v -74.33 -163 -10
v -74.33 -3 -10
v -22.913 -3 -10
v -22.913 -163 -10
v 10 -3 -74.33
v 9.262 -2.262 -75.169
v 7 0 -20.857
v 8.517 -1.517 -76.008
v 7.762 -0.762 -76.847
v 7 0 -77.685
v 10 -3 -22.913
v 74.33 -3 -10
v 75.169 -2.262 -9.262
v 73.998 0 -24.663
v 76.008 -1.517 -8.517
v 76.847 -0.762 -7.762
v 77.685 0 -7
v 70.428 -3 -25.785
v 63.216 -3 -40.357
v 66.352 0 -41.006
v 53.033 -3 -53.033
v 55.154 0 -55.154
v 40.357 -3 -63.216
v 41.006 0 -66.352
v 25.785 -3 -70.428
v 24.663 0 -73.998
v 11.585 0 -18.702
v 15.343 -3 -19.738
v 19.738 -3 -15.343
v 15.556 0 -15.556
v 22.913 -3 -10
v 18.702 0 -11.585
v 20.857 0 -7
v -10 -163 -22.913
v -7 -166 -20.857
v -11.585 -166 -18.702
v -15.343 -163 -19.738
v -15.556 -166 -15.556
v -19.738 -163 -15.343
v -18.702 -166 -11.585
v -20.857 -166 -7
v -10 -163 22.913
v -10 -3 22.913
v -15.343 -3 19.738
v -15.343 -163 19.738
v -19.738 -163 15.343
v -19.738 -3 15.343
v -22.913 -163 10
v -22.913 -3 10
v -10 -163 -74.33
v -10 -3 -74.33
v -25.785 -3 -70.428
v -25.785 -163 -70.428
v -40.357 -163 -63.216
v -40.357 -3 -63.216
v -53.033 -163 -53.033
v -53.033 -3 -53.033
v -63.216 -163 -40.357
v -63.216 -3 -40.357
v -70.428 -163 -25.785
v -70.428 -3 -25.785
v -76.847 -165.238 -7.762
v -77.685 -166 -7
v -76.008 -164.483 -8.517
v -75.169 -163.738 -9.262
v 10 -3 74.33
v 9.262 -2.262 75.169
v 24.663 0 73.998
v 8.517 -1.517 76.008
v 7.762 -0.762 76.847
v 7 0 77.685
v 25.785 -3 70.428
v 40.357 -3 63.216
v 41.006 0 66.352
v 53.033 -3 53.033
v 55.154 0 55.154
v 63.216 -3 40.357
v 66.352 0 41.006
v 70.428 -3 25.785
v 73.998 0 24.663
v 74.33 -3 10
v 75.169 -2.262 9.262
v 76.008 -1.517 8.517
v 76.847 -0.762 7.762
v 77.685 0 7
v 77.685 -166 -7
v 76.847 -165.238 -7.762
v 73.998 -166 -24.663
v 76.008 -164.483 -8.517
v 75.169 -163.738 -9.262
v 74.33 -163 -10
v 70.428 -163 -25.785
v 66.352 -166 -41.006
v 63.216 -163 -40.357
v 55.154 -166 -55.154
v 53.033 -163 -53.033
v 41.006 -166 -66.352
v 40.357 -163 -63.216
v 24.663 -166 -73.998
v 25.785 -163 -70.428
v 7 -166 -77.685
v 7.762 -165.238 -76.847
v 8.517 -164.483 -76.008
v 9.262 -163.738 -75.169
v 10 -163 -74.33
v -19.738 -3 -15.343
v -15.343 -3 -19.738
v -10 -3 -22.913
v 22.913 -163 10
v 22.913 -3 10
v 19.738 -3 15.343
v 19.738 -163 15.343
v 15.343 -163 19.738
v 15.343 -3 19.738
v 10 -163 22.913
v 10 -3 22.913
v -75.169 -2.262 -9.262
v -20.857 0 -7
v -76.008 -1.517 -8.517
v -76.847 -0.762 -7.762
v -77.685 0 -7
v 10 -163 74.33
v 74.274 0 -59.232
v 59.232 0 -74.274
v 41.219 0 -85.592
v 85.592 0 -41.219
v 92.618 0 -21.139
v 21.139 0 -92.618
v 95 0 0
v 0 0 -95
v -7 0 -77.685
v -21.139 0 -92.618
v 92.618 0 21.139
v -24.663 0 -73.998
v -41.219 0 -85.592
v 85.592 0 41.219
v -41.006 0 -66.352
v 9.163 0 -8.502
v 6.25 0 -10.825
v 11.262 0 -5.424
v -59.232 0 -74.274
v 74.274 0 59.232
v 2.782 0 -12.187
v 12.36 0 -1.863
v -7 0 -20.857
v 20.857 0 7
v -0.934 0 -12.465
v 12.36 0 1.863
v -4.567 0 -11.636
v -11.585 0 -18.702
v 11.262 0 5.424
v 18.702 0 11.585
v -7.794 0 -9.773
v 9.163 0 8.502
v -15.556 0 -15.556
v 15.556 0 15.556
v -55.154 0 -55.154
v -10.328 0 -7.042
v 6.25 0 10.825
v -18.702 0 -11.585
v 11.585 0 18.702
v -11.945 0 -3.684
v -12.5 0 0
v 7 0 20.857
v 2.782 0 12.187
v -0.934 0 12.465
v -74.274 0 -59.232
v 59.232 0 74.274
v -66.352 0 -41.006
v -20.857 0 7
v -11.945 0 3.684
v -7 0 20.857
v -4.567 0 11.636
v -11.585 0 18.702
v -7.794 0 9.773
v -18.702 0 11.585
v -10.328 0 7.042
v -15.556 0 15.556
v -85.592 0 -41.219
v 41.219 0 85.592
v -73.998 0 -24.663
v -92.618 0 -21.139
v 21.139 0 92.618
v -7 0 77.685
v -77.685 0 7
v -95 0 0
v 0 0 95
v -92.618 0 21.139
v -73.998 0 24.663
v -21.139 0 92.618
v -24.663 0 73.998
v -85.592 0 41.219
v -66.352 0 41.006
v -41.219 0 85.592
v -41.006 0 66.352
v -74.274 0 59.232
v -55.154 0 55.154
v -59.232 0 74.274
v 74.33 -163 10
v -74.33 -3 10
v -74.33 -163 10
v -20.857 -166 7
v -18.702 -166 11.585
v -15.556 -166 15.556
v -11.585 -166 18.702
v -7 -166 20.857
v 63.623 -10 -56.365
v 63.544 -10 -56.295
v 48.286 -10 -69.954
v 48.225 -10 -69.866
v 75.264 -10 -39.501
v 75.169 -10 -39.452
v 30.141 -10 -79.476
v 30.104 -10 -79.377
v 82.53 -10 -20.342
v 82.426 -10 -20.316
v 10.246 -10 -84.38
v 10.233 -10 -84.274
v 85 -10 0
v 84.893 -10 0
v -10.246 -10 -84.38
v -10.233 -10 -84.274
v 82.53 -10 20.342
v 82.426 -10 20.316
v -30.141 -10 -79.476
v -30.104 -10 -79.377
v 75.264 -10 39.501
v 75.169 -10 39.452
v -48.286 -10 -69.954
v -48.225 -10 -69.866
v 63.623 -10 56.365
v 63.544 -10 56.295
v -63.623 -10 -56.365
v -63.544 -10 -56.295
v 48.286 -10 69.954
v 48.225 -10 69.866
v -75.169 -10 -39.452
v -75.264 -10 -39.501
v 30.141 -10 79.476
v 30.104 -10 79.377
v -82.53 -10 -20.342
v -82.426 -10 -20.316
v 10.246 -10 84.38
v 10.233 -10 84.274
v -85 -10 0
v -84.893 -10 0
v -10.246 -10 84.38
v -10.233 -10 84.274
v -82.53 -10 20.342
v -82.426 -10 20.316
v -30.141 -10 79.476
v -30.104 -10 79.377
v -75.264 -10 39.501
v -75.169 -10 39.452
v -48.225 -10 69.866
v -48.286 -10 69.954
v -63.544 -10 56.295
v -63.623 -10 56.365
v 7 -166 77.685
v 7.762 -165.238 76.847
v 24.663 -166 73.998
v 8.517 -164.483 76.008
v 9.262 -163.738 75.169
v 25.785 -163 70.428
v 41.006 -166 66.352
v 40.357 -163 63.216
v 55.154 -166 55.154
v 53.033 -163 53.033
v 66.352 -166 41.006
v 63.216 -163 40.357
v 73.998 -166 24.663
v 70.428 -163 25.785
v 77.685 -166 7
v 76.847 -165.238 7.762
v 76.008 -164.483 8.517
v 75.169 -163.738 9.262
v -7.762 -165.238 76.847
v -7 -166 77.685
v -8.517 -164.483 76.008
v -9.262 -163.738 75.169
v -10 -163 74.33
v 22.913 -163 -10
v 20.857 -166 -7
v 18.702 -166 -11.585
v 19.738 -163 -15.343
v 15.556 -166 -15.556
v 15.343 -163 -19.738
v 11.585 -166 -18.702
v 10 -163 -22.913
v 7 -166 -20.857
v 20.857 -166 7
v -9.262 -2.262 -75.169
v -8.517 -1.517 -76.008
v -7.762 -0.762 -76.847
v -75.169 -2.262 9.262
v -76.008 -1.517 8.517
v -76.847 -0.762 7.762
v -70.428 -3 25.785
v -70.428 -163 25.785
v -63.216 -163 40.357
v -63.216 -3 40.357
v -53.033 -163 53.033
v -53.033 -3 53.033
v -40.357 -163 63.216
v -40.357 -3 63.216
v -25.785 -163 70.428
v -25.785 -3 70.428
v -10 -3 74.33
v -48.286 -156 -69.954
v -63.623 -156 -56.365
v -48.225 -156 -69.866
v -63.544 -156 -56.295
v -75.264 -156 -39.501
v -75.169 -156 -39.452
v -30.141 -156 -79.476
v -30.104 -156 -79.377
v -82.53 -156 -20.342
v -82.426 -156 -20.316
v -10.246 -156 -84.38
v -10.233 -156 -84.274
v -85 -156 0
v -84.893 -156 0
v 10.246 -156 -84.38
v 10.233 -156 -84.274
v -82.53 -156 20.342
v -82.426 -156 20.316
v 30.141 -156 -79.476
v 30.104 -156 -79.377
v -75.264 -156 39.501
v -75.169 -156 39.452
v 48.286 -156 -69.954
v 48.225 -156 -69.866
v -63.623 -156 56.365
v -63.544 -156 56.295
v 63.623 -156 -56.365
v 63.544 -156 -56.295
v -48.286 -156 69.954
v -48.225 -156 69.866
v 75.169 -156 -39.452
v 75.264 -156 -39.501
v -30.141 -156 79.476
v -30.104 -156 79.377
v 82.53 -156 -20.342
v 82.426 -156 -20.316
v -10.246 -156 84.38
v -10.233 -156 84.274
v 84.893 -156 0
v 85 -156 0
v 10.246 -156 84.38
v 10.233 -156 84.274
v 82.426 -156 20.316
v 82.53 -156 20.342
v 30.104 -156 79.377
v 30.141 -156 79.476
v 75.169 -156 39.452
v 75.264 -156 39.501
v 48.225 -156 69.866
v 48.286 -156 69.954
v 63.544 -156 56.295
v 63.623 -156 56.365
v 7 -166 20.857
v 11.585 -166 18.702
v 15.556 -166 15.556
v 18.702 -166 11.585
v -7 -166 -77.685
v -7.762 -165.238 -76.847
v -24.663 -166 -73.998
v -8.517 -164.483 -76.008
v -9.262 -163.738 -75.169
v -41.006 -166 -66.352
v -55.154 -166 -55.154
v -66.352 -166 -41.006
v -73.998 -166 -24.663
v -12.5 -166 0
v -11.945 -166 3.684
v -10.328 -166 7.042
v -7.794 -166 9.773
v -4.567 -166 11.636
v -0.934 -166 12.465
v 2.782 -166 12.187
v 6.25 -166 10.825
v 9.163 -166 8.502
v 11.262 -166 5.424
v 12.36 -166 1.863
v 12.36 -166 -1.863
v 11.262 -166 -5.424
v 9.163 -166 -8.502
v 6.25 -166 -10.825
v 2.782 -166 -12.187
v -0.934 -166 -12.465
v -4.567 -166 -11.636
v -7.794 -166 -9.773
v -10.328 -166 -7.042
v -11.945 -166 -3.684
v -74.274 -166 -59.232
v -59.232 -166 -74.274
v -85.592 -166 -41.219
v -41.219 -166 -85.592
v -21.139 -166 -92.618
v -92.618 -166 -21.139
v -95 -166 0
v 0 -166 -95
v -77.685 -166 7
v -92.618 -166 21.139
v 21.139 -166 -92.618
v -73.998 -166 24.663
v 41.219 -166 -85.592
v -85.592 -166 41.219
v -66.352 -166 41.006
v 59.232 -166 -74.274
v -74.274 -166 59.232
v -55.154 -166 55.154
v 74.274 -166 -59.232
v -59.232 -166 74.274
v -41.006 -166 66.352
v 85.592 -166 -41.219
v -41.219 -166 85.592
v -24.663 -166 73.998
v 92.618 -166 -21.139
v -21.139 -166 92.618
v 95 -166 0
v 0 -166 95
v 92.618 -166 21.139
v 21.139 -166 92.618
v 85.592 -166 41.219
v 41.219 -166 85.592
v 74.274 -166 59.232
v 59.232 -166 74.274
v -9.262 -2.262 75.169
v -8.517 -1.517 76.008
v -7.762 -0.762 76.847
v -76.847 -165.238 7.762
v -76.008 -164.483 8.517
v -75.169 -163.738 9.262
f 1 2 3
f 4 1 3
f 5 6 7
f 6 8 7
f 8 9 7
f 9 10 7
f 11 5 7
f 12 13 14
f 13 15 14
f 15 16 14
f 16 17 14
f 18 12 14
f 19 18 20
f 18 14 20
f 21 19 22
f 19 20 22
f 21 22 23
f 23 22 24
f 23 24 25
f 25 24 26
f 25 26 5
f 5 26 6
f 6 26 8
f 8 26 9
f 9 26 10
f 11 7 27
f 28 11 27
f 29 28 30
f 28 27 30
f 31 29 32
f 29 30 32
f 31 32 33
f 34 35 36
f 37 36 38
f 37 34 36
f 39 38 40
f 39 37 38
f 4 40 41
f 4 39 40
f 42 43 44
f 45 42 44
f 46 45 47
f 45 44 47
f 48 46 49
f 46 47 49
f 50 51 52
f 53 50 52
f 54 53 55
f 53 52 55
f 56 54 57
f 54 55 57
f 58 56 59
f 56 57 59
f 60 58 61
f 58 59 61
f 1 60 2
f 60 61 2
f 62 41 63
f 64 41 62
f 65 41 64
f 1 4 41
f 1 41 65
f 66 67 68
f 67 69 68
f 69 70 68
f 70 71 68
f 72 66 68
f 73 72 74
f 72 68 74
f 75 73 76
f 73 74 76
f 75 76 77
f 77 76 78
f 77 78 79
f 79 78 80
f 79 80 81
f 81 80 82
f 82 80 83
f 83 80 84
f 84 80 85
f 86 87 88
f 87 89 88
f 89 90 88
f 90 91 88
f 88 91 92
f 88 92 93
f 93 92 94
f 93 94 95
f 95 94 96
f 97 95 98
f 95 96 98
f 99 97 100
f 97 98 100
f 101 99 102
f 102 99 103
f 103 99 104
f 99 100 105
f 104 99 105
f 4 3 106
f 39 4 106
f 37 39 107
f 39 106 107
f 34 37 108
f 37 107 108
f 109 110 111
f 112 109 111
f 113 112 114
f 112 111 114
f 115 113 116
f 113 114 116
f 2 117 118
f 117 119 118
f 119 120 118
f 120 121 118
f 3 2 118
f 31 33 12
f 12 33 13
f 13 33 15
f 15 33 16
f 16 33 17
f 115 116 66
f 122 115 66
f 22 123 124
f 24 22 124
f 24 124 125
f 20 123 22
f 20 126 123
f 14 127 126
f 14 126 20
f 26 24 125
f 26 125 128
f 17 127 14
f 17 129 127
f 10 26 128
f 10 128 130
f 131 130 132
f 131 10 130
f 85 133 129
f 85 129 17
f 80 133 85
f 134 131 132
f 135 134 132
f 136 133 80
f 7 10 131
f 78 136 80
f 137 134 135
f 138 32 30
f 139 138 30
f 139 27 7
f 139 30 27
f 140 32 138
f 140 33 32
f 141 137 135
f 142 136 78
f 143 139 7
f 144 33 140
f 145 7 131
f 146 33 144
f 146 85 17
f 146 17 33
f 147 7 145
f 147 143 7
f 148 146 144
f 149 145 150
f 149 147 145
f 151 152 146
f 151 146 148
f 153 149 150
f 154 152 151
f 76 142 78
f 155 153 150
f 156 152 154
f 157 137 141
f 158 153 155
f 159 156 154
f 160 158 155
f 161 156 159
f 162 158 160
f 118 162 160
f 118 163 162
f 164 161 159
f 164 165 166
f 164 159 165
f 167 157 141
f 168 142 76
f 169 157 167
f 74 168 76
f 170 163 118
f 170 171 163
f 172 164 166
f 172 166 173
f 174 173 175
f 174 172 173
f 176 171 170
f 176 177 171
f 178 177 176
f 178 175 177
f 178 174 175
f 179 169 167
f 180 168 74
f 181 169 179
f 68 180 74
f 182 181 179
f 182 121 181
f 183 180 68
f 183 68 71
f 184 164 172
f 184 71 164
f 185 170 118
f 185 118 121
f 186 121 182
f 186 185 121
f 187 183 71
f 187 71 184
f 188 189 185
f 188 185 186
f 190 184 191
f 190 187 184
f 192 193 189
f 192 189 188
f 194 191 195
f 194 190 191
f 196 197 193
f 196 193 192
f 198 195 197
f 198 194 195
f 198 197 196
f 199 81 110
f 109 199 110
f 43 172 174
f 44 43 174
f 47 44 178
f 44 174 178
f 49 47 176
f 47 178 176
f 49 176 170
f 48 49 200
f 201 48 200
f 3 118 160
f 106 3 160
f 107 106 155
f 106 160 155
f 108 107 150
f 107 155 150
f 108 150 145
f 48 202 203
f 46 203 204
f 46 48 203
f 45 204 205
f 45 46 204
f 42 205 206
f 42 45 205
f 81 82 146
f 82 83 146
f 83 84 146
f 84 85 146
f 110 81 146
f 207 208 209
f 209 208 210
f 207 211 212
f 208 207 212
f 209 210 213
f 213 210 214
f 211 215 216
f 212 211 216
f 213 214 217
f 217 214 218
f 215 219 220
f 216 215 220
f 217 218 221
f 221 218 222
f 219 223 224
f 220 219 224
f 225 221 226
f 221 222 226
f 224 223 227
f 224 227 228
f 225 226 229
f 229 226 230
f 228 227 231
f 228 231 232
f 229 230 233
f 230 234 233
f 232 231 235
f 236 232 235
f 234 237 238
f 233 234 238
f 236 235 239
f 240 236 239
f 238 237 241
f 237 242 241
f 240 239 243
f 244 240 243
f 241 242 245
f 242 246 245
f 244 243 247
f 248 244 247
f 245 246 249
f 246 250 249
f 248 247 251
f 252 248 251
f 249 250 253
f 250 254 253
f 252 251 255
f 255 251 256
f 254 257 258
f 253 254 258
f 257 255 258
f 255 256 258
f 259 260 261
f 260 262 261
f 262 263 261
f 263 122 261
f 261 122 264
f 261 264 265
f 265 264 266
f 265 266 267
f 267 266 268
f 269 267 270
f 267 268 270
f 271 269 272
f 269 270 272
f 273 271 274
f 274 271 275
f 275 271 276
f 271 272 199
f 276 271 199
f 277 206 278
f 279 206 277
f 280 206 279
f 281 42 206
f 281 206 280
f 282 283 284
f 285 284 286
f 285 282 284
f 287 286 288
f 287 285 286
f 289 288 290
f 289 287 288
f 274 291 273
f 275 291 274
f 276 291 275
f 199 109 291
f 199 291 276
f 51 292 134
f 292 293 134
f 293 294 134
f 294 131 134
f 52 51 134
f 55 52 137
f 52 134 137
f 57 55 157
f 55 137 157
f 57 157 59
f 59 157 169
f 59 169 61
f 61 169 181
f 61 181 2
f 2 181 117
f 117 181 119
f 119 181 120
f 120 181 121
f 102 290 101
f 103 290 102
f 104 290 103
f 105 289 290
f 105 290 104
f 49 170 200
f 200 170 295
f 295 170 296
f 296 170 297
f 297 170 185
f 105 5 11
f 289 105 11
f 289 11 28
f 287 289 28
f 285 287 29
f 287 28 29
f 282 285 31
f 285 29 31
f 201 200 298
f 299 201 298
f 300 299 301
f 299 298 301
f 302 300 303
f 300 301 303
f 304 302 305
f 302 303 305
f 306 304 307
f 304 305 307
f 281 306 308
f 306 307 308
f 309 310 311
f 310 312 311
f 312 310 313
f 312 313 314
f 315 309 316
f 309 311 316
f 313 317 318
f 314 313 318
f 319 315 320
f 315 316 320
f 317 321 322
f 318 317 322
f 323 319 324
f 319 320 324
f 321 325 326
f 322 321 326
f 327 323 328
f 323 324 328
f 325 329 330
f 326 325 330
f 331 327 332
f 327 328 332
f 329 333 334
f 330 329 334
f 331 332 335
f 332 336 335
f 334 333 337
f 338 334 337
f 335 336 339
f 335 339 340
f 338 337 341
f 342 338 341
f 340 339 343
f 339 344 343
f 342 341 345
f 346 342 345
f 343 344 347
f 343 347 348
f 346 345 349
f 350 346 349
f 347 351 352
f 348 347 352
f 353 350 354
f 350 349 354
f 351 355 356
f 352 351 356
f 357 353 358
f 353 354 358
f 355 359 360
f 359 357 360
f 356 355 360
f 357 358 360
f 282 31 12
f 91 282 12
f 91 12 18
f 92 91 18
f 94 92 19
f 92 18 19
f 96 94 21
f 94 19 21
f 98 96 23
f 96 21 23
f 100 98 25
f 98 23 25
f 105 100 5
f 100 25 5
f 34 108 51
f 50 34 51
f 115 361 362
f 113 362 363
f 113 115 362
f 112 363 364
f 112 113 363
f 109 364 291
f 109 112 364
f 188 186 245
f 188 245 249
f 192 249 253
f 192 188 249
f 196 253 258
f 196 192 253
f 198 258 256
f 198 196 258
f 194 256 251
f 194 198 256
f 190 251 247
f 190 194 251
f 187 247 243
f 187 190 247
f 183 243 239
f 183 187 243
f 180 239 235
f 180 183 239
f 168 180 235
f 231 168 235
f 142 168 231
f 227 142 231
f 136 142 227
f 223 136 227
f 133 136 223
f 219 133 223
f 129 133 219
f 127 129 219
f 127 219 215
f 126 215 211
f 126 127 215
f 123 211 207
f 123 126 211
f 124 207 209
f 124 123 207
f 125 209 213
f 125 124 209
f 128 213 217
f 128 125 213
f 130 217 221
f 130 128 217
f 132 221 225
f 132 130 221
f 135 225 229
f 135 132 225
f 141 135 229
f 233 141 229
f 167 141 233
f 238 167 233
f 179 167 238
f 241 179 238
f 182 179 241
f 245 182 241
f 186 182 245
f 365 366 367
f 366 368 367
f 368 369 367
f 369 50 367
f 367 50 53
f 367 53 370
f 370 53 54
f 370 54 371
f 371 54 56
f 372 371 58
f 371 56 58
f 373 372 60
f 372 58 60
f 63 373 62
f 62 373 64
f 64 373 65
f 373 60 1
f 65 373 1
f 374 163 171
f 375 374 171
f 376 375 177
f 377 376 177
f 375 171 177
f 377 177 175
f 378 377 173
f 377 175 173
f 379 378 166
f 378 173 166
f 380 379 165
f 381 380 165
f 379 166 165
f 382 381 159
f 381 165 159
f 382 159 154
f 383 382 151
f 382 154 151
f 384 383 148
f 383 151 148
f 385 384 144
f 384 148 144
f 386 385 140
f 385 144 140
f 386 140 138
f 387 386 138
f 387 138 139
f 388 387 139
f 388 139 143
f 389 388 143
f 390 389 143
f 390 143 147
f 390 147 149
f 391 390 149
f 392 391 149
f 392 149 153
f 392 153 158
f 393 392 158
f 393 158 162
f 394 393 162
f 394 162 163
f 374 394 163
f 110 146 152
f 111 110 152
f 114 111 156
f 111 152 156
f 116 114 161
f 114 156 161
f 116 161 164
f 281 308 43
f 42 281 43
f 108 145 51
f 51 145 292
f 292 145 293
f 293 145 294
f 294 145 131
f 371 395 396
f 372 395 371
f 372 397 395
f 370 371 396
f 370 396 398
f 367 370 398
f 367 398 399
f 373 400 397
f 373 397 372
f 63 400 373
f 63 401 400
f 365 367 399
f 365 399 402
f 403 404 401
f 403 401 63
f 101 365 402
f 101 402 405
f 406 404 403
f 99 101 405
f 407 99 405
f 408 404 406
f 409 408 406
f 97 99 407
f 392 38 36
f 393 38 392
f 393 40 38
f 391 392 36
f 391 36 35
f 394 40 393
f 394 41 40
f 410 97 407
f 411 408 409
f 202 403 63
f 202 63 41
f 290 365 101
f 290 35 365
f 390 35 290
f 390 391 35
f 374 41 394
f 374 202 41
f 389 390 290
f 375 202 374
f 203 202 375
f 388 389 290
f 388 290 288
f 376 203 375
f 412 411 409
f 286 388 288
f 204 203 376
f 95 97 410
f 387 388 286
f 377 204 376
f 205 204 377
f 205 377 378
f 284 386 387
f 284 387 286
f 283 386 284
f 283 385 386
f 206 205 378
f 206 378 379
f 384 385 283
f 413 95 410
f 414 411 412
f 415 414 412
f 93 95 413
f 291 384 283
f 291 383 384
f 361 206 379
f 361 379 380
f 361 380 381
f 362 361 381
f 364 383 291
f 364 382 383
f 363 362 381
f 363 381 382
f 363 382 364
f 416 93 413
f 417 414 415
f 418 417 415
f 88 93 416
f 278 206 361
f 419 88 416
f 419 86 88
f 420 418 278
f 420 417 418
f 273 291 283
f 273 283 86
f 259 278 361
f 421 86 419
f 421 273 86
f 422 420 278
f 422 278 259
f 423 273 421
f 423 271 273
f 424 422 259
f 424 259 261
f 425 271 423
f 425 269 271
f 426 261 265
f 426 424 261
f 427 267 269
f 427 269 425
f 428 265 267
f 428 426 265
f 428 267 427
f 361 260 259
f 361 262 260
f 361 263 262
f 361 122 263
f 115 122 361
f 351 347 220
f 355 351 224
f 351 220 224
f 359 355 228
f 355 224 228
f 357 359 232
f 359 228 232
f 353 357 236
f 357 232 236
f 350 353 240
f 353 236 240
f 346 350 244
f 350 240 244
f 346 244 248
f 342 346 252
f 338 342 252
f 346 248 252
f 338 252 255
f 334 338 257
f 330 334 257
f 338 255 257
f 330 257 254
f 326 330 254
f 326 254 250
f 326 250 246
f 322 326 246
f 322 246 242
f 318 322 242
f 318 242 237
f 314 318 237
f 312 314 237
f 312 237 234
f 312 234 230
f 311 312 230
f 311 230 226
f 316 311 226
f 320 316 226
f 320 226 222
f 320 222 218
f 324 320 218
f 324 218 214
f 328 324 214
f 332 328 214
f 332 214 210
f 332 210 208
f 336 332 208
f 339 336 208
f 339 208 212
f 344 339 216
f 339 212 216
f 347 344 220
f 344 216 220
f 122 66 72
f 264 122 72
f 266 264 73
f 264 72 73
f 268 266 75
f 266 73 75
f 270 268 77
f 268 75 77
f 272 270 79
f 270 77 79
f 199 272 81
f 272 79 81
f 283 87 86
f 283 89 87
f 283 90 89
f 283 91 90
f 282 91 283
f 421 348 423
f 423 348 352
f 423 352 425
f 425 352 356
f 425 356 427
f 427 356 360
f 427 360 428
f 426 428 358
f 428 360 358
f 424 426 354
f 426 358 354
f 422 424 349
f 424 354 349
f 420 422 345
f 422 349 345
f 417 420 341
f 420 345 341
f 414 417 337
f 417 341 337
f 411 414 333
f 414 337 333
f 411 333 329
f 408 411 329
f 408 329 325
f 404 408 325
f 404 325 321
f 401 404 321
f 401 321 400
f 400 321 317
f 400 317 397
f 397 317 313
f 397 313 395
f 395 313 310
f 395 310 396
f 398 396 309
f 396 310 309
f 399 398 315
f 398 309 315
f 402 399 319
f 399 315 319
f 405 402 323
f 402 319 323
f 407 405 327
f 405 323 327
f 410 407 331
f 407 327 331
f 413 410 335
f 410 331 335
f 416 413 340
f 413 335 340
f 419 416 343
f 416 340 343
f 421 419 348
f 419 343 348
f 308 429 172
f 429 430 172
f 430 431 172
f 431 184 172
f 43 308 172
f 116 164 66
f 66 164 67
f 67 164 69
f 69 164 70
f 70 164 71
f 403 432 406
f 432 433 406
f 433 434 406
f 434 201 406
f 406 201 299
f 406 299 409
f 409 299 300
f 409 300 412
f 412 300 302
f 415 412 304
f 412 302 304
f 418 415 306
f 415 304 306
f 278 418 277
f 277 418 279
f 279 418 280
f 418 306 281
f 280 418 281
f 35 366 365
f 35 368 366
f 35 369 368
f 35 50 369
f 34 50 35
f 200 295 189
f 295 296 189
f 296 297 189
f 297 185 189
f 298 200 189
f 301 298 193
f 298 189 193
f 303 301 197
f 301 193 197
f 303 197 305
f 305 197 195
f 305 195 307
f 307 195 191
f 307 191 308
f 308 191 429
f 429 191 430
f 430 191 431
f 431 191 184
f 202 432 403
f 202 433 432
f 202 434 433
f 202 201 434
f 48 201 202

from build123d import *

# Parameters (mm, degrees)
F0_R     = 84.89324665
F1_DEPTH = 166
F2_R     = 95
F2_R_2   = 84.89324665
F3_DEPTH = 10
F4_R     = 95
F4_R_2   = 84.89324665
F5_DEPTH = 10
F6_SIZE  = 9.99999
F7_R     = 12.5
F8_DEPTH = 166.001
F9_SIZE  = 3


# Not quite as in the source:
# - a fillet or chamfer is up to 0.001 mm smaller than in the source, because OpenCascade refuses the exact size


with BuildPart() as f1:
    # F0 (on Front) → F1 (new body)
    with BuildSketch(Plane.XZ):
        Circle(F0_R)
    extrude(amount=F1_DEPTH)

    # F2 (on face) → F3 (join)
    with BuildSketch(Plane(origin=(0, 0, 0), x_dir=(-1, 0, 0), z_dir=(0, 1, 0))):
        Circle(F2_R)
        Circle(F2_R_2, mode=Mode.SUBTRACT)
    extrude(amount=-F3_DEPTH)

    # F4 (on face) → F5 (join)
    with BuildSketch(Plane.XZ.offset(166)):
        Circle(F4_R)
        Circle(F4_R_2, mode=Mode.SUBTRACT)
    extrude(amount=-F5_DEPTH)

    # F6 (size 10 in the source; OpenCascade refuses exactly that, so slightly less here)
    f6_edges = [f1.edges().sort_by_distance(p)[0] for p in [
        (95, -10, 0),
        (-95, -156, 0),
    ]]
    chamfer(f6_edges, length=F6_SIZE)

    # F7 (on face) → F8 (cut, through all)
    with BuildSketch(Plane(origin=(0, 0, 0), x_dir=(-1, 0, 0), z_dir=(0, 1, 0))):
        with BuildLine():
            Line((-10, 22.9128784748), (-10, 74.3303437366))
            ThreePointArc((-10, 74.3303437366), (-53.033008589, 53.033008589), (-74.3303437366, 10))
            Line((-74.3303437366, 10), (-22.9128784748, 10))
            ThreePointArc((-22.9128784748, 10), (-17.6776695297, 17.6776695297), (-10, 22.9128784748))
        make_face()
        with BuildLine():
            Line((22.9128784748, 10), (74.3303437366, 10))
            ThreePointArc((74.3303437366, 10), (53.033008589, 53.033008589), (10, 74.3303437366))
            Line((10, 74.3303437366), (10, 22.9128784748))
            ThreePointArc((10, 22.9128784748), (17.6776695297, 17.6776695297), (22.9128784748, 10))
        make_face()
        with BuildLine():
            ThreePointArc((-74.3303437366, -10), (-53.033008589, -53.033008589), (-10, -74.3303437366))
            Line((-10, -74.3303437366), (-10, -22.9128784748))
            ThreePointArc((-10, -22.9128784748), (-17.6776695297, -17.6776695297), (-22.9128784748, -10))
            Line((-22.9128784748, -10), (-74.3303437366, -10))
        make_face()
        with BuildLine():
            ThreePointArc((10, -74.3303437366), (53.033008589, -53.033008589), (74.3303437366, -10))
            Line((74.3303437366, -10), (22.9128784748, -10))
            ThreePointArc((22.9128784748, -10), (17.6776695297, -17.6776695297), (10, -22.9128784748))
            Line((10, -22.9128784748), (10, -74.3303437366))
        make_face()
        Circle(F7_R)
    extrude(amount=-F8_DEPTH, mode=Mode.SUBTRACT)

    # F9
    f9_edges = [f1.edges().sort_by_distance(p)[0] for p in [
        (-53.033009, -166, 53.033009),
        (-10, -166, 48.621611),
        (-48.621611, -166, 10),
        (-17.67767, -166, 17.67767),
        (53.033009, -166, 53.033009),
        (48.621611, -166, 10),
        (17.67767, -166, 17.67767),
        (10, -166, 48.621611),
        (48.621611, -166, -10),
        (53.033009, -166, -53.033009),
        (17.67767, -166, -17.67767),
        (10, -166, -48.621611),
        (-10, -166, -48.621611),
        (-17.67767, -166, -17.67767),
        (-48.621611, -166, -10),
        (-53.033009, -166, -53.033009),
        (-53.033009, 0, 53.033009),
        (-10, 0, 48.621611),
        (-17.67767, 0, 17.67767),
        (-48.621611, 0, 10),
        (-53.033009, 0, -53.033009),
        (-48.621611, 0, -10),
        (-17.67767, 0, -17.67767),
        (-10, 0, -48.621611),
        (10, 0, 48.621611),
        (53.033009, 0, 53.033009),
        (17.67767, 0, 17.67767),
        (48.621611, 0, 10),
        (17.67767, 0, -17.67767),
        (10, 0, -48.621611),
        (48.621611, 0, -10),
        (53.033009, 0, -53.033009),
    ]]
    chamfer(f9_edges, length=F9_SIZE)


solid = f1.part
